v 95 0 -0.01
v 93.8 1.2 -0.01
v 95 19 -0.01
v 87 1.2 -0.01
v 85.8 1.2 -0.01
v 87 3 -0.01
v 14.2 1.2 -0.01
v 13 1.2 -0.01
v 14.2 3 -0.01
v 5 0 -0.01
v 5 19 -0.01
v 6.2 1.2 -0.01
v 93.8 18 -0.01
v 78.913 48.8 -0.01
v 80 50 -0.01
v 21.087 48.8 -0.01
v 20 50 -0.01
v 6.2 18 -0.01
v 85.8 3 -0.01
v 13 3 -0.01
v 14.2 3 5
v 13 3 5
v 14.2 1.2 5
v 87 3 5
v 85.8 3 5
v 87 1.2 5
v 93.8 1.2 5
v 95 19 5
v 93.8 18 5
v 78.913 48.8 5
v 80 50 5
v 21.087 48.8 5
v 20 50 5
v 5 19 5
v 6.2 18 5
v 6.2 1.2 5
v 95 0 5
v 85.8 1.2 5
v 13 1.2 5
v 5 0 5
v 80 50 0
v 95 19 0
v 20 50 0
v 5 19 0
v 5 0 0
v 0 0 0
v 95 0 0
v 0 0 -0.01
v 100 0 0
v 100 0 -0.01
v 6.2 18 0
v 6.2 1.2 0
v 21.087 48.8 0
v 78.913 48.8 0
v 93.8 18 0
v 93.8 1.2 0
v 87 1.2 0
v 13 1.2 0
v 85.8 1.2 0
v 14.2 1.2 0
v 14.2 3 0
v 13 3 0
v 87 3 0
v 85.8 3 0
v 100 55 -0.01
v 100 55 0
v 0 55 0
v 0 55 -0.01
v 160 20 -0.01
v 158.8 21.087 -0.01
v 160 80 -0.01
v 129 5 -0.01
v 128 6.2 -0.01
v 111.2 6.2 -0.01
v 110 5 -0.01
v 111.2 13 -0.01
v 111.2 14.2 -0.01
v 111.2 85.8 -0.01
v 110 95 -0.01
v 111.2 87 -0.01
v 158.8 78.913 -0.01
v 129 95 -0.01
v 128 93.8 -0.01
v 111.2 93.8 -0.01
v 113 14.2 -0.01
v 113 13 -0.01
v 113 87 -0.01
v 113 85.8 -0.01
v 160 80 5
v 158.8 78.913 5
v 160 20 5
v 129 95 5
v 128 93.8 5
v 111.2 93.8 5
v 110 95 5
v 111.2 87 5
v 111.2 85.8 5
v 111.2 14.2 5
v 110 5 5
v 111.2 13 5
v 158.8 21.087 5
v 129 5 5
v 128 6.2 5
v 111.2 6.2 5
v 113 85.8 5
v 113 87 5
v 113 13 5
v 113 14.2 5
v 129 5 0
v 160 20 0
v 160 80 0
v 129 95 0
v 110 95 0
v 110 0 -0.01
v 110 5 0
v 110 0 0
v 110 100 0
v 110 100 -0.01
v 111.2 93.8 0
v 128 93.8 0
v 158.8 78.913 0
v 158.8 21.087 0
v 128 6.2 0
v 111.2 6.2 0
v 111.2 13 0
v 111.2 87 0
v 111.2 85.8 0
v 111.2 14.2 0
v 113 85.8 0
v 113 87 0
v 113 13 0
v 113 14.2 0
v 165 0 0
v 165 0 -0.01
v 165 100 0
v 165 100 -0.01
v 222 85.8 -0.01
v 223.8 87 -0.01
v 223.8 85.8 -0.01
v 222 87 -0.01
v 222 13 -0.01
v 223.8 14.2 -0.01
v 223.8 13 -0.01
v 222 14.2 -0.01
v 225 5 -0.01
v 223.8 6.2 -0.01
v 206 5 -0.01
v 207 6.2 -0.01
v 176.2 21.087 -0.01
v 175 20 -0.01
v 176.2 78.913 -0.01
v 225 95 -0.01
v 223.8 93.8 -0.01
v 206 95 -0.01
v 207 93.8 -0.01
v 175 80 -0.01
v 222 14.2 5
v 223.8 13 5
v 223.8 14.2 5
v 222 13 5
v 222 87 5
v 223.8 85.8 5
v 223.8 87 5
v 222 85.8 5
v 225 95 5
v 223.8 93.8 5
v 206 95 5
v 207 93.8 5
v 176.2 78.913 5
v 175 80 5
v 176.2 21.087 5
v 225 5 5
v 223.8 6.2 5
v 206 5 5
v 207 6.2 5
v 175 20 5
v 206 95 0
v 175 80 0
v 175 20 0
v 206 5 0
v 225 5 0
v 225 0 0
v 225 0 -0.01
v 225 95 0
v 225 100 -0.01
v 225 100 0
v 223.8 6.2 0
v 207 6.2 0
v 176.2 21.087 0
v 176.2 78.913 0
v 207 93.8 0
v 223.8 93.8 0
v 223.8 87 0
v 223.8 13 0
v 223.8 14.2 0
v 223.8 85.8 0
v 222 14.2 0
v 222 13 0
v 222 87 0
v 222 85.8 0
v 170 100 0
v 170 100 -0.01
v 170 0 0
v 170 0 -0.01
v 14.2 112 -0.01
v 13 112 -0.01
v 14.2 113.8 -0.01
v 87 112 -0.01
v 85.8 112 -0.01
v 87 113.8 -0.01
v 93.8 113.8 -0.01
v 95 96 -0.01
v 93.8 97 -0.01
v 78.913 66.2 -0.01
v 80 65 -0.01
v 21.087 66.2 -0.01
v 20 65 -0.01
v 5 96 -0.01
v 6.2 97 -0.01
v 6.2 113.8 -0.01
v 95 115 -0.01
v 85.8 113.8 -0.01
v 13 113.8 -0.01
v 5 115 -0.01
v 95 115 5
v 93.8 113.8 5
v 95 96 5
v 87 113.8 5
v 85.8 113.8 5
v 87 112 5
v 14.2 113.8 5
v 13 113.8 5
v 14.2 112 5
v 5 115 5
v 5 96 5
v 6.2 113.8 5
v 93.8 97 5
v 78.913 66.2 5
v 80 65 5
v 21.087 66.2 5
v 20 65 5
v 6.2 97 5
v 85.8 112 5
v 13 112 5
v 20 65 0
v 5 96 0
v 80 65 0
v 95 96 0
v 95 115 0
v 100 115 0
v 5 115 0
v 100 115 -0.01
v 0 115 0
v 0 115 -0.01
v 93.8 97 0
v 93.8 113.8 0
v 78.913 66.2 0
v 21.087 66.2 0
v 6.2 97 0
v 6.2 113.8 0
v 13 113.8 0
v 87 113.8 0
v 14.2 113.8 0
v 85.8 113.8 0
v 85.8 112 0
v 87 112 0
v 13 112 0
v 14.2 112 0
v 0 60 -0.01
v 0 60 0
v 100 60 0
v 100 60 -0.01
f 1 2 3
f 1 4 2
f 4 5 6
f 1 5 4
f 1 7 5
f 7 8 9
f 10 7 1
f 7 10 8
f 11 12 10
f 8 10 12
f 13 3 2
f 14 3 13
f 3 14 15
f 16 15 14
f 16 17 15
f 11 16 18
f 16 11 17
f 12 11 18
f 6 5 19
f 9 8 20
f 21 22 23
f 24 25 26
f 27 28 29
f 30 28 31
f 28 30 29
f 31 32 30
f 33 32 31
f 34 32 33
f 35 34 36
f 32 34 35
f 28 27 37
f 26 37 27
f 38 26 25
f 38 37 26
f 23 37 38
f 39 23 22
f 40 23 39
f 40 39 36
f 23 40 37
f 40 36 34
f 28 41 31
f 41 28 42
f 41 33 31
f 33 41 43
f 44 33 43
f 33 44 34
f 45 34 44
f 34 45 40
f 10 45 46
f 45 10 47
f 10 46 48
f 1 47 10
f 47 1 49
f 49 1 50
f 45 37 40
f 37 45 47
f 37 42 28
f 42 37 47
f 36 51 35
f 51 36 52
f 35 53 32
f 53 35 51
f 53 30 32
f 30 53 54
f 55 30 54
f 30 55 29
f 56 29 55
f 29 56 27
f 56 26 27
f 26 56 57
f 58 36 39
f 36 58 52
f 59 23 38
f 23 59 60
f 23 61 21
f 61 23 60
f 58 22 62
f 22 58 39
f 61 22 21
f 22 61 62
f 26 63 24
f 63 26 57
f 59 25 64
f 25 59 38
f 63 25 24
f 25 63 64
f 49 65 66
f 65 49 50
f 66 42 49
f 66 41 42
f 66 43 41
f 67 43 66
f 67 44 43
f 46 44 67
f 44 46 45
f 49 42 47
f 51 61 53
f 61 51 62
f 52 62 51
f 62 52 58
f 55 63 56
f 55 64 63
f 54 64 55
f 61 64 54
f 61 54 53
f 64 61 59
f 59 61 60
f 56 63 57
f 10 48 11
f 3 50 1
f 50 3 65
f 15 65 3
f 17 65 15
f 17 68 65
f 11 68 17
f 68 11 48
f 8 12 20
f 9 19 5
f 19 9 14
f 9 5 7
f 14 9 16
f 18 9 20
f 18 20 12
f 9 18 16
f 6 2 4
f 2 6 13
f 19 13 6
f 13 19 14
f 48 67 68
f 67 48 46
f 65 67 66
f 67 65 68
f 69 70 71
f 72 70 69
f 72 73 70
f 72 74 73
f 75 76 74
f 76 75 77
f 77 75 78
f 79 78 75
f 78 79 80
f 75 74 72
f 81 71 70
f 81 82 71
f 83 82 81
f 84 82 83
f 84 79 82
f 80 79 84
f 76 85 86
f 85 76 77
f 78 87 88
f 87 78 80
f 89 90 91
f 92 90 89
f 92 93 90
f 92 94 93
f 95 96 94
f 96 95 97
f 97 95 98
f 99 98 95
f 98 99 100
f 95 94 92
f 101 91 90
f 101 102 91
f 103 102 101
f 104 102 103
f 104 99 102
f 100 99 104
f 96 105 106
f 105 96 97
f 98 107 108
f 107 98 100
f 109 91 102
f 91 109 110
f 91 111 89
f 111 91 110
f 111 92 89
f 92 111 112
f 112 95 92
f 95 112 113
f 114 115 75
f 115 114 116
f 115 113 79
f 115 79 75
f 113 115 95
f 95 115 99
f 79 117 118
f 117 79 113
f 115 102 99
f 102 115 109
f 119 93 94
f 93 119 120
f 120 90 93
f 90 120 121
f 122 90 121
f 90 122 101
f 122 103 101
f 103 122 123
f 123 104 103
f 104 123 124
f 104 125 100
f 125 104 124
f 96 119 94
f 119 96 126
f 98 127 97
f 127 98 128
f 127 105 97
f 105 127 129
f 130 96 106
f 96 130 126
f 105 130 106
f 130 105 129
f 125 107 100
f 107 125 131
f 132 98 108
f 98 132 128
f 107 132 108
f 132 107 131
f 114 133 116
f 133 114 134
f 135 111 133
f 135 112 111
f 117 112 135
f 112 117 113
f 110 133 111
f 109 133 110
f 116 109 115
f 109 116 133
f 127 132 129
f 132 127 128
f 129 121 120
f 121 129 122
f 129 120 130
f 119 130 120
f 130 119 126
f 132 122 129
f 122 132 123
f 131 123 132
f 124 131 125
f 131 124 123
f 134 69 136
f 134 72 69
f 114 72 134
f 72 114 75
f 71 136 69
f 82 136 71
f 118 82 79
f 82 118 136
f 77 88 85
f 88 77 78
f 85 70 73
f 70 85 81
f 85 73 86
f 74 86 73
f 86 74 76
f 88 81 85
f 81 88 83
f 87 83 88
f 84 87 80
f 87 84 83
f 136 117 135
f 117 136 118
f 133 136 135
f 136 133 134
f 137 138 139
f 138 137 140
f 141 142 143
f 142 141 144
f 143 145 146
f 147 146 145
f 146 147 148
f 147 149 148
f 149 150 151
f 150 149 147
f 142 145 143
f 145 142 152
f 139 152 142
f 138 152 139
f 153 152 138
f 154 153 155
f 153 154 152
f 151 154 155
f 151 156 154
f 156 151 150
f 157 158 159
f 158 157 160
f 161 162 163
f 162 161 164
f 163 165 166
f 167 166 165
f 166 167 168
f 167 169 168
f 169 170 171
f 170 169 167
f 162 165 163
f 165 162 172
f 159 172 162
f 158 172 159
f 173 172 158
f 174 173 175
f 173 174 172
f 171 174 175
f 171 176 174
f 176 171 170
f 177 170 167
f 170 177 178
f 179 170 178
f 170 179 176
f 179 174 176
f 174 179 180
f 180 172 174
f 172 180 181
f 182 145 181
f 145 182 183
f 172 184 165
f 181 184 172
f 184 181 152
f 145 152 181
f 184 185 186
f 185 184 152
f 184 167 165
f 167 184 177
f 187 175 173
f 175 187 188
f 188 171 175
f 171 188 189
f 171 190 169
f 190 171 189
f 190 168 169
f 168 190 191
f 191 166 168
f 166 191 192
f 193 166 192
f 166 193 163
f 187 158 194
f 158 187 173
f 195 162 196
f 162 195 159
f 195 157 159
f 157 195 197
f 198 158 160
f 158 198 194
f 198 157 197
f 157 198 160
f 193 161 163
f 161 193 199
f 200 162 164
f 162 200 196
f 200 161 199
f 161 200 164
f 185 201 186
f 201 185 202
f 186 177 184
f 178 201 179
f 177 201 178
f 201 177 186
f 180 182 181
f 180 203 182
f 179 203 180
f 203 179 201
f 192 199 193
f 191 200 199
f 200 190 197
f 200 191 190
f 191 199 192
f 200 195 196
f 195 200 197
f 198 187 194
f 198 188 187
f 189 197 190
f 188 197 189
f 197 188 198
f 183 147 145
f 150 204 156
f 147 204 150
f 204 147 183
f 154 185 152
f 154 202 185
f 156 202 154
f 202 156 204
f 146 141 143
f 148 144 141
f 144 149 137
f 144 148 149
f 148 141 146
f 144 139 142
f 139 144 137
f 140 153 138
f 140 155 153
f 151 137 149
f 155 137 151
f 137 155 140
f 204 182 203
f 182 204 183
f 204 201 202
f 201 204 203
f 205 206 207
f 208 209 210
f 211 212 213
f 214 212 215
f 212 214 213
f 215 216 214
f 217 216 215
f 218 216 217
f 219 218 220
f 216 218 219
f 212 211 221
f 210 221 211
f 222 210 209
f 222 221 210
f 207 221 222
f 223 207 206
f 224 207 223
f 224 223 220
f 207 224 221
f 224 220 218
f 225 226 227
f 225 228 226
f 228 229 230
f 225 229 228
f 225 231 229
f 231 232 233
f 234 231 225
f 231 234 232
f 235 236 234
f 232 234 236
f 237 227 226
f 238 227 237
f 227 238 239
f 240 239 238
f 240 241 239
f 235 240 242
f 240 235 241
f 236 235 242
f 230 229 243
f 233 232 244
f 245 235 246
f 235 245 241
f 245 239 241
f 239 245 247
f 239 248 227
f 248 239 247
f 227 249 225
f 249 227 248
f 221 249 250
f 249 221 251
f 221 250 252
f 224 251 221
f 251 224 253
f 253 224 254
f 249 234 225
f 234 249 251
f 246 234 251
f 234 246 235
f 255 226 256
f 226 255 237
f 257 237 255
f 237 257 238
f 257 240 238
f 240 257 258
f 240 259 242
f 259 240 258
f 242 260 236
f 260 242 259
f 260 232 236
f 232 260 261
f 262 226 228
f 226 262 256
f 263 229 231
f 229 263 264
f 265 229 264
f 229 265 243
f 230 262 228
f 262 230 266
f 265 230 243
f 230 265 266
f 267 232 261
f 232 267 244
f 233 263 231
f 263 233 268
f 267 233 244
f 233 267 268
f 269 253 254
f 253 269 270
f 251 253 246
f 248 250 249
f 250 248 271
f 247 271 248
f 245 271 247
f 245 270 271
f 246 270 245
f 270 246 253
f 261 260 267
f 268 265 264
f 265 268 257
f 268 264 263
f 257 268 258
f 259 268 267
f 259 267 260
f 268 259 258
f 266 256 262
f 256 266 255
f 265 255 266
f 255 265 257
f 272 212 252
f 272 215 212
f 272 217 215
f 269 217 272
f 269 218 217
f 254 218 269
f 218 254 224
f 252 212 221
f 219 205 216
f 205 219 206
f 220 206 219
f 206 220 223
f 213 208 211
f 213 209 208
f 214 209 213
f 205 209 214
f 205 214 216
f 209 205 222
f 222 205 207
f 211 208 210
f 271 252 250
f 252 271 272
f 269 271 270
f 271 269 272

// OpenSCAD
// file: ../../Base/Boxes.scad
// Fischertechnik Box Foundation
// Pre-designed Boxes

use <Constants.scad>

include <PlacementOptions.scad>

box190Width = 190;
box190Depth = 130;
box130Width = 130;
box130Depth = 95;
boxUsageHeight = 33.9;
boxWallThickness = 2.4;
boxBaseThickness = 1.0;

// getBoxWallThickness()
// Gets the wall thickness of a Fischertechnik Box

function getBoxWallThickness() = boxWallThickness;

// Gets the usable height of a fischertechnik box
function getBoxUsageHeight() = boxUsageHeight;

// Gets the thickness of the Fischertechnik box base.
function getBoxBaseThickness() = boxBaseThickness;

// Gets the usable inner space of a Box 190 as an x/y-list
function getBox190Space() = [
    box190Width - 2*getBoxWallThickness(), 
    box190Depth - 2*getBoxWallThickness() ];

// Imports the Fischertechnik empty box 130x190 mm and places it at position 0,0
// 190x130 are the outer sizes, the inner space is slightly smaller. Use getBox190Space() to get the inner sizes.
// This module needs the STL file "Fischertechnik Box 130x190.stl" in the library path.
// The box is positioned that the usable inner space is at the 0,0,0 position. The

module Box190() {
    translate([-getBoxWallThickness(),-getBoxWallThickness(),-getBoxBaseThickness()])
        import("Fischertechnik Box 130x190.stl", convexity=3);
}

// Gets the usable inner space of a Box 130 as an x/y-list
function getBox130Space() = [
    box130Width - 2*getBoxWallThickness(), 
    box130Depth - 2*getBoxWallThickness() ];

// Imports the Fischertechnik empty box 95x130 mm and places it at position 0,0
// 190x130 are the outer sizes, the inner space is slightly smaller. Use getBox190Space() to get the inner sizes.
// This module needs the STL file "Fischertechnik Box 95x130.stl" in the library path.
// The box is positioned that the usable inner space is at the 0,0,0 position. The

module Box130() {
    translate([-getBoxWallThickness(),-getBoxWallThickness(),-getBoxBaseThickness()])
        import("Fischertechnik Box 95x130.stl", convexity=3);
}

// Creates a web at the specified box walls
// corner 0 = LowerLeft, 1 = UpperLeft, 2 = UpperRight, 3 = LowerRight
// side 0 = LeftOfCorner, 1 = RightOfCorner
// distance = Distance in mm from the corner
// box = inner width and depth of the box (default: Box 190)
// webWidth = length of the web (default is 3 mms)
// webThickness = thickness of the web (default is 1 mm)

module BoxWeb(corner, side, distance, box=getBox190Space(), webWidth=3, webThickness=1.0) {
    sink = getBoxWallThickness()/2;

    width = (corner % 2 == 0) ? 
            (side == LeftOfCorner ? webWidth : webThickness) :
            (side == LeftOfCorner ? webThickness : webWidth);

    depth = (corner % 2 == 0) ? 
            (side == RightOfCorner ? webWidth : webThickness) :
            (side == RightOfCorner ? webThickness : webWidth);
    
    xDiff = corner == LowerLeft ? 
                (side == LeftOfCorner ? -sink : distance) :
            (corner == UpperLeft ?                
                (side == LeftOfCorner ? distance : -sink) :
            (corner == UpperRight ?
                (side == LeftOfCorner ? box.x-webWidth+sink : box.x-distance-webThickness) :
                (side == LeftOfCorner ? box.x-distance-webThickness: box.x-webWidth+sink)));

    yDiff = corner == LowerLeft ? 
                (side == RightOfCorner ? -sink : distance) :
            (corner == UpperLeft ?
                (side == RightOfCorner ? box.y-distance : box.y-webWidth+sink) :
            (corner == UpperRight ?
                (side == RightOfCorner ? box.y-webWidth+sink : box.y-distance) :
                (side == RightOfCorner ? distance : -sink)));
    
    translate([xDiff, yDiff, -getExcess()])
        cube([width, depth, boxUsageHeight + 2*getExcess()]);
}
// file: ../../Base/Rotation.scad
// Fischertechnik Box Foundation
// Geometry Helpers Rotation

include <PlacementOptions.scad>

// getRotatedSpace(space, rotation=NoRotation)
// Rotates the space dependent on the specified rotation

function getRotatedSpace(space, rotation=NoRotation) = [
    (rotation == Rotate90 || rotation == Rotate270) ? space.y : space.x,
    (rotation == Rotate90 || rotation == Rotate270) ? space.x : space.y
];

// Rotates the given space around the fixed left lower corner
// space = the space the children needs as width/depth list [width,depth]
// rotation = 0 Rotate0 degrees, 1 Rotate90 degrees, 2 Rotate180 degrees, 3 Rotate270 degrees (equivalent to -90)

module RotateFix(space, rotation=Rotate0) {
    dy = (rotation == Rotate0 || rotation == Rotate270) ? 0 :
        (rotation == Rotate90) ? space.x :
        space.y;
    dx = (rotation < Rotate180) ? 0 :
        (rotation == Rotate180) ? space.x :
        space.y;
    
    translate([dx, dy, 0])
        rotate([0, 0, rotations[rotation]])
            children();
}
// file: ../../Base/Alignment.scad
// Fischertechnik Box Foundation
// Geometry Helpers Alignment

include <PlacementOptions.scad>

// getAlignedX(elementWidth, spaceWidth, align=AlignRight, offset=0)
// Gets the aligned X offset of an element with the given
// width in the given space.
// elementWidth = The width of the element to positon
// spaceWidth = The space where the element should be aligned
// align = 0 AlignLeft, 1 AlignCenter, 2 AlignRight
// offset = an optional offset from the aligned position. When
// aligned left or centered, then positive values are in X direction.
// When aligned right then positive values are in negative X direction.

function getAlignedX(elementWidth, spaceWidth, align=AlignRight, offset=0) =
    (align == AlignLeft) ?
        offset :
        ((align == AlignCenter) ?
        (spaceWidth - elementWidth)/2 + offset :
        spaceWidth - offset - elementWidth);

// getAlignedY(elementDepth, spaceDepth, align=AlignTop, offset=0)
// Gets the aligned Y offset of an element with the given
// depth in the given space.
// elementDepth = The depth of the element to positon
// spaceDepth = The space where the element should be aligned
// align = 0 AlignBottom, 1 AlignCenter, 2 AlignTop
// offset = an optional offset from the aligned position. When
// aligned bottom or centered, then positive values are in Y direction.
// When aligned top then positive values are in negative Y direction.

function getAlignedY(elementDepth, spaceDepth, align=AlignTop, offset=0) =
    (align == AlignBottom) ?
        offset :
        ((align == AlignCenter) ?
        (spaceDepth - elementDepth)/2 + offset :
        spaceDepth - offset - elementDepth);
// file: ../../Base/Constants.scad
// Fischertechnik Box Foundation
// Constants

// Constant values necessary for multiple elements

// Base constants
dividerThickness = 1.2;
excess = 0.01;
fragments = 90;
tolerance = 0.8;

// Gets the thickness of a divider 
function getDividerThickness() = dividerThickness;

// Gets the excess that is used to merge walls into each other
function getExcess() = excess;

// Gets amount of fragments of a cylinder
function getFragments() = fragments;

// Gets the inner tolerance of a frame to each side
function getTolerance() = tolerance;


// Fischertechnik specific constants
axisDiameter = 4;
axisBottomDiameter = axisDiameter + 1;
standardEdgeDistance = 2.5;
standardWebDistance = 11.5;
standardCornerLength = 15;
tubeWallFactor = 1.6;

// Gets axis diameter
function getAxisDiameter() = axisDiameter;

// Gets axis bottom diameter for thicker part at the bottom
function getAxisBottomDiameter() = axisBottomDiameter;

// gets the standard distance to the wall of the box for dockable frames with webs
function getStandardEdgeDistance() = standardEdgeDistance;

// gets the standard distance of each web to the corner of the dockable frame
function getStandardWebDistance() = standardWebDistance;

// gets the standard length of the corner walls of a dockable frame
function getStandardCornerLength() = standardCornerLength;

// gets the wall thickness of a tube.
function getTubeWallThickness() = tubeWallFactor * getDividerThickness();
// file: ../../Base/PlacementOptions.scad
// Fischertechnik Box Foundation
// Placement Options

// Alignment
NoAlign = 0;
AlignLeft = 1;
AlignBottom = 2;
AlignCenter = 3;
AlignRight = 4;
AlignTop = 5;

// Element rotation degree steps
rotations = [0, -90, -180, -270];

// Rotation
NoRotation = 0;
Rotate0 = 0;
Rotate90 = 1;
Rotate180 = 2;
Rotate270 = 3;

// Docking (seen from above)
NoDock = -1;
DockLeft = 0;
DockTop = 1;
DockRight = 2;
DockCorner = 2;
DockBottom = 3;

// Web corners
LowerLeft = 0;
UpperLeft = 1;
UpperRight = 2;
LowerRight = 3;

// Web position relative to corner
LeftOfCorner = 0;
RightOfCorner = 1;
// file: ../../Elements/FrameDriversCabLeftRight.scad
// Fischertechnik Box Library
// Frame for Driver's Cab Left and Right Side
// 38435, 38436

use <../Base/Constants.scad>
use <../ModelBase/Simple.scad>

spaceWidth = 100;
spaceDepth = 55;

// getFrameDriversCabLeftRightSpace()
// Gets the space the frame driver's cab left an right side needs as width (.x and .y as a list)

function getFrameDriversCabLeftRightSpace() = [spaceWidth, spaceDepth];

// FrameDriversCabLeftRight()
// Frame for Driver's Cab Left and Right Side
// 38435, 38436

module FrameDriversCabLeftRight() {
    Space ([spaceWidth, spaceDepth]);
    
    widthBottom = 90;
    widthTop = 60;
    depthBottom = 18;
    depthTop = 32;
    depthWeb = 3;
    height = 5;
    totalHeight = height + getExcess();
    
    xTopLeft = (widthBottom - widthTop) / 2;
    xTopRight = xTopLeft + widthTop;
    yTop = depthBottom + depthTop;
    xBottomRight = widthBottom;
    xBottomOffset = (spaceWidth - widthBottom) / 2;
    t = getDividerThickness();
    tX = (depthTop/sqrt(depthTop*depthTop + xTopLeft*xTopLeft)) * t;

    points = [ 
        [0, 0], 
        [0, depthBottom + 1 ], 
        [xTopLeft, yTop], 
        [xTopRight, yTop],
        [xBottomRight, depthBottom +1],
        [xBottomRight, 0],
        [t, t], 
        [t, depthBottom], 
        [xTopLeft+tX, yTop-t], 
        [xTopRight-tX, yTop-t],
        [xBottomRight-t, depthBottom],
        [xBottomRight-t, t],
        ];
    paths = [[0,1,2,3,4,5],[6,7,8,9,10,11]];

    webOffset1 = 8;
    webOffset2 = widthBottom - webOffset1 - getDividerThickness();

    translate([xBottomOffset, 0, -getExcess()]) {    
        linear_extrude(height = totalHeight)
            polygon (points, paths);
        translate([webOffset1, 0, 0])
            cube([getDividerThickness(), depthWeb, totalHeight]);
        translate([webOffset2, 0, 0])
            cube([getDividerThickness(), depthWeb, totalHeight]);        
    }
}

// Test
color("lightgray") {
FrameDriversCabLeftRight();
}
// file: ../../Base/Placement.scad
// Fischertechnik Box Foundation
// Geometry Helpers Placement

use <Constants.scad>
use <Alignment.scad>
use <Rotation.scad>
use <Boxes.scad>

include <PlacementOptions.scad>

// Place(x=0, y=0, elementSpace=[0,0], alignX=AlignLeft, alignY=AlignBottom, rotation=Rotate0, boxSpace=getBox190Space())
// Places the child at the specified position
// y = Y-Position. This is a relative position when an X aligment is specified.
// x = X-Position. This is a relative position when an Y aligment is specified.
// elementSpace = space of the element to be placed [x,y]
// alignX = -1=NoAlign, 0 AlignLeft, 1 AlignCenter, 3 AlignRight (elementSpace and boxSpace required!)
// alignY = -1=NoAlign, 2 AlignBottom, 1 AlignCenter, 4 AlignTop (elementSpace and boxSpace required!)
// rotation = 0 Rotate0 0 degrees, 1 Rotate90 90 degrees, 
// 2 Rotate180 180 degrees, 3 Rotate270 270 degrees (equivalent to -90)
// boxSpace = Inner space of the box where the placement occurs [x,y] - default is Box 190x130 inner space

module Place(x=0, y=0, elementSpace=[0,0], 
  alignX=AlignLeft, alignY=AlignBottom, 
  rotation=NoRotation, boxSpace=getBox190Space()) {

    module Position(x, y, space, rotation=Rotate0) {
        translate([x, y, 0])
            RotateFix(space, rotation)
                children(0);
    }

    space = getRotatedSpace(elementSpace, rotation);
    alignedX = getAlignedX(space.x, boxSpace.x, alignX, x);
    alignedY = getAlignedY(space.y, boxSpace.y, alignY, y);
    Position(alignedX, alignedY, elementSpace, rotation)
        children(0);
}

// Center(space=getBox130Space(), elementSpace=[0,0])
// space = Space where the children is centered. For cylinder use centered=true and no elementSpace.
// elementSpace = space of the element to be centered [x,y]

module Center(space=getBox190Space(), elementSpace=[0,0]) {
    translate([(space.x - elementSpace.x) / 2, (space.y - elementSpace.y) / 2])
        children(0);
}

// CenterHorizontal(width=0, y=0, offset=0, space=getBox130Space())
// space = Space where the children is centered. For cylinder use centered=true and no elementSpace.
// elementSpace = space of the element to be centered [x,y]

module CenterHorizontal(width=0, y=0, offset=0, space=getBox190Space()) {
    translate([(space.x - width) / 2 + offset, y])
        children(0);
}

// CenterVertical(depth=0, x=0, offset=0, space=getBox130Space())
// space = Space where the children is centered. For cylinder use centered=true and no elementSpace.
// elementSpace = space of the element to be centered [x,y]

module CenterVerticalal(depth=0, x=0, offset=0, space=getBox190Space()) {
    translate([x, (space.y - depth) / 2 + offset])
        children(0);
}
// main file
// Fischertechnik Box Foundation
// Elements
// Test FrameDriversCabLeftRight

use <../../Base/Placement.scad>
use <../../Elements/FrameDriversCabLeftRight.scad>

include <../../Base/PlacementOptions.scad>

FrameDriversCabLeftRight();

Place(110, 0, elementSpace=getFrameDriversCabLeftRightSpace(), rotation=Rotate90)
    FrameDriversCabLeftRight();
    
Place(170, 0, elementSpace=getFrameDriversCabLeftRightSpace(), rotation=Rotate270)
    FrameDriversCabLeftRight();
    
Place(0, 60, elementSpace=getFrameDriversCabLeftRightSpace(), rotation=Rotate180)
    FrameDriversCabLeftRight();
